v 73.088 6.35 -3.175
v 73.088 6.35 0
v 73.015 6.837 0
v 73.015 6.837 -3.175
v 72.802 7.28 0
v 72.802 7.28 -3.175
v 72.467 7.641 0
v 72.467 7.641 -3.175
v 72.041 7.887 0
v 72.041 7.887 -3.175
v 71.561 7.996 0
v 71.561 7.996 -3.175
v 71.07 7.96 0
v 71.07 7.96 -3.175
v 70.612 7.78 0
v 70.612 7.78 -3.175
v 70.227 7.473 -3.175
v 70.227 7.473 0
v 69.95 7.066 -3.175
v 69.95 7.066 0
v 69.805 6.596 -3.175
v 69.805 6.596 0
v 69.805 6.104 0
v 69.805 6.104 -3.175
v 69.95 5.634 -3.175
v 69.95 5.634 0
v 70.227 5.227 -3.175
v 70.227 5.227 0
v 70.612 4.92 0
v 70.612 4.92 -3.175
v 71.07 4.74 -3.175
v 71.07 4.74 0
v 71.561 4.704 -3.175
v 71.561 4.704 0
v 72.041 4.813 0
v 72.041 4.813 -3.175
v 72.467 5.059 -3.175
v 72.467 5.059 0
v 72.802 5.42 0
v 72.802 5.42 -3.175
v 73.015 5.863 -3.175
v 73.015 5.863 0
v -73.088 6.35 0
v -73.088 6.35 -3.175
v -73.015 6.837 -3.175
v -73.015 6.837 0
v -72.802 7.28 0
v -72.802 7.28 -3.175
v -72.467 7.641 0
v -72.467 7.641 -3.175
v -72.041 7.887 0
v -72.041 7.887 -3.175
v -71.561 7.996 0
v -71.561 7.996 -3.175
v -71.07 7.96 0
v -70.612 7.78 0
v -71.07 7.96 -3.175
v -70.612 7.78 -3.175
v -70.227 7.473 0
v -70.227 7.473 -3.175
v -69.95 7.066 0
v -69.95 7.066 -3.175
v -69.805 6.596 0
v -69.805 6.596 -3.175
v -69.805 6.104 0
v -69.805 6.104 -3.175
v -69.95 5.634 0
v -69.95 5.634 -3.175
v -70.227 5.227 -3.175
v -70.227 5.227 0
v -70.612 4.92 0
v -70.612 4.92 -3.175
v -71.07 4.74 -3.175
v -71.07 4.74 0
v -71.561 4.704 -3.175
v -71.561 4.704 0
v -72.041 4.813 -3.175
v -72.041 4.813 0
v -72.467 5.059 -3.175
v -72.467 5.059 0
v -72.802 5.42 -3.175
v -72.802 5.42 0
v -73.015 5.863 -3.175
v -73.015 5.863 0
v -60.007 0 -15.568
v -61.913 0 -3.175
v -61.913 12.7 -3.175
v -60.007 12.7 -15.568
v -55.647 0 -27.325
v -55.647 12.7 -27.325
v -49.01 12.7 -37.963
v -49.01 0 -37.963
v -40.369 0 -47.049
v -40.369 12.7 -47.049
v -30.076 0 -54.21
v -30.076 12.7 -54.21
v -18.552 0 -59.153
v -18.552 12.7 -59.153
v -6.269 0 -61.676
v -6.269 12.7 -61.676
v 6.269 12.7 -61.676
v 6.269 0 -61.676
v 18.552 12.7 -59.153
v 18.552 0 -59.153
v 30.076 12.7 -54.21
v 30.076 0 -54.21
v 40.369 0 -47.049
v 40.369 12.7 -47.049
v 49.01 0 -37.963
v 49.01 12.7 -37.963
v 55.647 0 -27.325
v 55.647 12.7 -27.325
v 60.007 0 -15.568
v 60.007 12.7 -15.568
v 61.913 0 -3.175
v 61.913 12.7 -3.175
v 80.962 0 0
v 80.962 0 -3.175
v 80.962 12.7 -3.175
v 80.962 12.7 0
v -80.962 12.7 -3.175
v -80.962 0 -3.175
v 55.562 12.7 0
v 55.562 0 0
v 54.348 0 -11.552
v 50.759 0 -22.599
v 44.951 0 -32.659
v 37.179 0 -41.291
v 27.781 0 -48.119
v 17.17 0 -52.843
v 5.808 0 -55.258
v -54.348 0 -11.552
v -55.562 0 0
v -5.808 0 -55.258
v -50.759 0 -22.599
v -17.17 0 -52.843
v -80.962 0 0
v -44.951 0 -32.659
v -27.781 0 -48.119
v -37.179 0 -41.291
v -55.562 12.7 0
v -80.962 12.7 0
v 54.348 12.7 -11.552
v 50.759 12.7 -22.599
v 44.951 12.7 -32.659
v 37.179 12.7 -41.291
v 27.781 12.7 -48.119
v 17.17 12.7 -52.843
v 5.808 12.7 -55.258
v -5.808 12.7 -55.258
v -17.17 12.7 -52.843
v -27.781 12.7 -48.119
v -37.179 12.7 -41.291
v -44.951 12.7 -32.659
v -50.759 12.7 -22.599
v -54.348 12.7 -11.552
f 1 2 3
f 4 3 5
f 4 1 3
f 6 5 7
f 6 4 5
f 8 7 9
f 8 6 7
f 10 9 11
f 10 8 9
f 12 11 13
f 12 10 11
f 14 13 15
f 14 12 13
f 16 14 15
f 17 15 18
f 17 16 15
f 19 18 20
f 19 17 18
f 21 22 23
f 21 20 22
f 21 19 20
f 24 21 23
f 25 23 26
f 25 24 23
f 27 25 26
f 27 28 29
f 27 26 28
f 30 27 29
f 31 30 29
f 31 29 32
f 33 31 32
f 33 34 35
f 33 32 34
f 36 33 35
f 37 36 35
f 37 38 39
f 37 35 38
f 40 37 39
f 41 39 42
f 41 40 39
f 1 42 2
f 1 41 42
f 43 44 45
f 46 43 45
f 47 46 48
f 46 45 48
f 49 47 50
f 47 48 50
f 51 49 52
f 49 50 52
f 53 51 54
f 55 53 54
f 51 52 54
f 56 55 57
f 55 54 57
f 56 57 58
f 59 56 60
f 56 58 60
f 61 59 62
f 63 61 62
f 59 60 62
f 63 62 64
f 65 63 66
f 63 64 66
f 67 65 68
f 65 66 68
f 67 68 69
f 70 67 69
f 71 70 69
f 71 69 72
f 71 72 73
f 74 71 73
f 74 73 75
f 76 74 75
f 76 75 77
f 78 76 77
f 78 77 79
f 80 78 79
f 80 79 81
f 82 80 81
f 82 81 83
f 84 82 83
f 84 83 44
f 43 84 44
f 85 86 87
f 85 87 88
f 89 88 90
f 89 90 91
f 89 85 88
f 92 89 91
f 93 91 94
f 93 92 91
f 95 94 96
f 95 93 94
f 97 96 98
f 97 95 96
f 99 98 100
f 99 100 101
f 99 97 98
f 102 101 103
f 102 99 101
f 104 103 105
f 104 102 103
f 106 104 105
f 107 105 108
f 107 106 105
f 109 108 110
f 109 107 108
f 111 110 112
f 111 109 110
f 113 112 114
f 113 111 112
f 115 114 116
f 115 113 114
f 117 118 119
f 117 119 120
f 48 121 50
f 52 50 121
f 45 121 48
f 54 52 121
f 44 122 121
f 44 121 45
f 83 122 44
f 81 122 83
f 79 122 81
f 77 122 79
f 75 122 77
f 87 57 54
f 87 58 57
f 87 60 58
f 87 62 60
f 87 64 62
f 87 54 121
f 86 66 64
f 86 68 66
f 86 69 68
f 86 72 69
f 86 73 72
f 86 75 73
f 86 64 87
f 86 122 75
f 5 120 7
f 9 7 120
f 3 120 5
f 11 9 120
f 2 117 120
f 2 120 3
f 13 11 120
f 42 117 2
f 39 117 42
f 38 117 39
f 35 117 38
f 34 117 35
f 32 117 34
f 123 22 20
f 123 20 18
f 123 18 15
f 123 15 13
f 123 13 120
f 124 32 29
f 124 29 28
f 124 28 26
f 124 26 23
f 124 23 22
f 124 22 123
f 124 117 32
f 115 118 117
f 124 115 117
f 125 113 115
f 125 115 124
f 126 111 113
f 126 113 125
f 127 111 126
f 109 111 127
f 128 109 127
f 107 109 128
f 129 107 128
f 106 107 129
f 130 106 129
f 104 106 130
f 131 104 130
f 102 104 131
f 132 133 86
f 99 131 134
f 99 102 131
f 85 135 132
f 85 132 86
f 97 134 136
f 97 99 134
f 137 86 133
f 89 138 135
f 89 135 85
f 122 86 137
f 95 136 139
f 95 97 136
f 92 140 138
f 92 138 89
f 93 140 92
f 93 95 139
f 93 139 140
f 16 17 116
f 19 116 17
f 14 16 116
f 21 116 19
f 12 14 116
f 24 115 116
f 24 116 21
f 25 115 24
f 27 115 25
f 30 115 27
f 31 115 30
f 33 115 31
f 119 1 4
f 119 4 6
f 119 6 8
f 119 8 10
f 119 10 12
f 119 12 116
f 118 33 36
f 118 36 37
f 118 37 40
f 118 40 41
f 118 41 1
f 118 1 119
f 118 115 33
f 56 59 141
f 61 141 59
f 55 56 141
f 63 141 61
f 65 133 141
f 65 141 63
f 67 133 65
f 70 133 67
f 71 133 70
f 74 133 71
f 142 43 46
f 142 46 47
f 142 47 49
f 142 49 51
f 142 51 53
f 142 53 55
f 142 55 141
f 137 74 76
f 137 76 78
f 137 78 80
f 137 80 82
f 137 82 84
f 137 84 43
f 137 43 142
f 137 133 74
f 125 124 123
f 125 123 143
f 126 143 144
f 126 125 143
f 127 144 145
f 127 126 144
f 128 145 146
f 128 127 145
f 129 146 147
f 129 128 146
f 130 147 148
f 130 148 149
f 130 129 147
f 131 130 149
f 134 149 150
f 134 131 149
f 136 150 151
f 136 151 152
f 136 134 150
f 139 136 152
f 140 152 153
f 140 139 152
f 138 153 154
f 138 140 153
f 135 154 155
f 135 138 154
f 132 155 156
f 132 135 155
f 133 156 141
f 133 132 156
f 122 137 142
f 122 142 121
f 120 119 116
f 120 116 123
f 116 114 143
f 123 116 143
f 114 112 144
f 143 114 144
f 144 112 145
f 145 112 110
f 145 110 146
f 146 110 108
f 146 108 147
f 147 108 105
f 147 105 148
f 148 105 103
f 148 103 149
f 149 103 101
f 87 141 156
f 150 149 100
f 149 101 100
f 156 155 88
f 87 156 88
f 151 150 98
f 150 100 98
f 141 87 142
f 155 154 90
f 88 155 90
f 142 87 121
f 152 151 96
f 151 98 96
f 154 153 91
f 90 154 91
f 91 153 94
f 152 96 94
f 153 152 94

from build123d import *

# Parameters (mm, degrees)
BOSS_EXTRUDE1_DEPTH = 12.7
SKETCH5_R           = 1.651
CUT_EXTRUDE1_DEPTH  = 4.175


with BuildPart() as part:
    # Sketch1 → Boss-Extrude1 (new body)
    with BuildSketch(Plane(origin=(0, 0, 0), x_dir=(1, 0, 0), z_dir=(0, 1, 0))):
        with BuildLine():
            Line((-55.5625, 0), (-80.9625, 0))
            Line((-80.9625, 0), (-80.9625, 3.175))
            Line((-80.9625, 3.175), (-61.9125, 3.175))
            ThreePointArc((-61.9125, 3.175), (0, 61.993856803), (61.9125, 3.175))
            Line((61.9125, 3.175), (80.9625, 3.175))
            Line((80.9625, 3.175), (80.9625, 0))
            Line((80.9625, 0), (55.5625, 0))
            ThreePointArc((55.5625, 0), (0, 55.5625), (-55.5625, 0))
        make_face()
    extrude(amount=BOSS_EXTRUDE1_DEPTH)

    # Sketch5 → Cut-Extrude1 (cut, through all)
    with BuildSketch(Plane(origin=(0, 0, -3.175), x_dir=(-1, 0, 0), z_dir=(0, 0, -1))):
        with Locations((71.4375, 6.35)):
            Circle(SKETCH5_R)
    cut_extrude1 = extrude(amount=-CUT_EXTRUDE1_DEPTH, mode=Mode.SUBTRACT)

    # Mirror1: Cut-Extrude1 across plane
    add(cut_extrude1.mirror(Plane(origin=(0, 0, 0), x_dir=(0, 0, 1), z_dir=(1, 0, 0))), mode=Mode.SUBTRACT)


solid = part.part
